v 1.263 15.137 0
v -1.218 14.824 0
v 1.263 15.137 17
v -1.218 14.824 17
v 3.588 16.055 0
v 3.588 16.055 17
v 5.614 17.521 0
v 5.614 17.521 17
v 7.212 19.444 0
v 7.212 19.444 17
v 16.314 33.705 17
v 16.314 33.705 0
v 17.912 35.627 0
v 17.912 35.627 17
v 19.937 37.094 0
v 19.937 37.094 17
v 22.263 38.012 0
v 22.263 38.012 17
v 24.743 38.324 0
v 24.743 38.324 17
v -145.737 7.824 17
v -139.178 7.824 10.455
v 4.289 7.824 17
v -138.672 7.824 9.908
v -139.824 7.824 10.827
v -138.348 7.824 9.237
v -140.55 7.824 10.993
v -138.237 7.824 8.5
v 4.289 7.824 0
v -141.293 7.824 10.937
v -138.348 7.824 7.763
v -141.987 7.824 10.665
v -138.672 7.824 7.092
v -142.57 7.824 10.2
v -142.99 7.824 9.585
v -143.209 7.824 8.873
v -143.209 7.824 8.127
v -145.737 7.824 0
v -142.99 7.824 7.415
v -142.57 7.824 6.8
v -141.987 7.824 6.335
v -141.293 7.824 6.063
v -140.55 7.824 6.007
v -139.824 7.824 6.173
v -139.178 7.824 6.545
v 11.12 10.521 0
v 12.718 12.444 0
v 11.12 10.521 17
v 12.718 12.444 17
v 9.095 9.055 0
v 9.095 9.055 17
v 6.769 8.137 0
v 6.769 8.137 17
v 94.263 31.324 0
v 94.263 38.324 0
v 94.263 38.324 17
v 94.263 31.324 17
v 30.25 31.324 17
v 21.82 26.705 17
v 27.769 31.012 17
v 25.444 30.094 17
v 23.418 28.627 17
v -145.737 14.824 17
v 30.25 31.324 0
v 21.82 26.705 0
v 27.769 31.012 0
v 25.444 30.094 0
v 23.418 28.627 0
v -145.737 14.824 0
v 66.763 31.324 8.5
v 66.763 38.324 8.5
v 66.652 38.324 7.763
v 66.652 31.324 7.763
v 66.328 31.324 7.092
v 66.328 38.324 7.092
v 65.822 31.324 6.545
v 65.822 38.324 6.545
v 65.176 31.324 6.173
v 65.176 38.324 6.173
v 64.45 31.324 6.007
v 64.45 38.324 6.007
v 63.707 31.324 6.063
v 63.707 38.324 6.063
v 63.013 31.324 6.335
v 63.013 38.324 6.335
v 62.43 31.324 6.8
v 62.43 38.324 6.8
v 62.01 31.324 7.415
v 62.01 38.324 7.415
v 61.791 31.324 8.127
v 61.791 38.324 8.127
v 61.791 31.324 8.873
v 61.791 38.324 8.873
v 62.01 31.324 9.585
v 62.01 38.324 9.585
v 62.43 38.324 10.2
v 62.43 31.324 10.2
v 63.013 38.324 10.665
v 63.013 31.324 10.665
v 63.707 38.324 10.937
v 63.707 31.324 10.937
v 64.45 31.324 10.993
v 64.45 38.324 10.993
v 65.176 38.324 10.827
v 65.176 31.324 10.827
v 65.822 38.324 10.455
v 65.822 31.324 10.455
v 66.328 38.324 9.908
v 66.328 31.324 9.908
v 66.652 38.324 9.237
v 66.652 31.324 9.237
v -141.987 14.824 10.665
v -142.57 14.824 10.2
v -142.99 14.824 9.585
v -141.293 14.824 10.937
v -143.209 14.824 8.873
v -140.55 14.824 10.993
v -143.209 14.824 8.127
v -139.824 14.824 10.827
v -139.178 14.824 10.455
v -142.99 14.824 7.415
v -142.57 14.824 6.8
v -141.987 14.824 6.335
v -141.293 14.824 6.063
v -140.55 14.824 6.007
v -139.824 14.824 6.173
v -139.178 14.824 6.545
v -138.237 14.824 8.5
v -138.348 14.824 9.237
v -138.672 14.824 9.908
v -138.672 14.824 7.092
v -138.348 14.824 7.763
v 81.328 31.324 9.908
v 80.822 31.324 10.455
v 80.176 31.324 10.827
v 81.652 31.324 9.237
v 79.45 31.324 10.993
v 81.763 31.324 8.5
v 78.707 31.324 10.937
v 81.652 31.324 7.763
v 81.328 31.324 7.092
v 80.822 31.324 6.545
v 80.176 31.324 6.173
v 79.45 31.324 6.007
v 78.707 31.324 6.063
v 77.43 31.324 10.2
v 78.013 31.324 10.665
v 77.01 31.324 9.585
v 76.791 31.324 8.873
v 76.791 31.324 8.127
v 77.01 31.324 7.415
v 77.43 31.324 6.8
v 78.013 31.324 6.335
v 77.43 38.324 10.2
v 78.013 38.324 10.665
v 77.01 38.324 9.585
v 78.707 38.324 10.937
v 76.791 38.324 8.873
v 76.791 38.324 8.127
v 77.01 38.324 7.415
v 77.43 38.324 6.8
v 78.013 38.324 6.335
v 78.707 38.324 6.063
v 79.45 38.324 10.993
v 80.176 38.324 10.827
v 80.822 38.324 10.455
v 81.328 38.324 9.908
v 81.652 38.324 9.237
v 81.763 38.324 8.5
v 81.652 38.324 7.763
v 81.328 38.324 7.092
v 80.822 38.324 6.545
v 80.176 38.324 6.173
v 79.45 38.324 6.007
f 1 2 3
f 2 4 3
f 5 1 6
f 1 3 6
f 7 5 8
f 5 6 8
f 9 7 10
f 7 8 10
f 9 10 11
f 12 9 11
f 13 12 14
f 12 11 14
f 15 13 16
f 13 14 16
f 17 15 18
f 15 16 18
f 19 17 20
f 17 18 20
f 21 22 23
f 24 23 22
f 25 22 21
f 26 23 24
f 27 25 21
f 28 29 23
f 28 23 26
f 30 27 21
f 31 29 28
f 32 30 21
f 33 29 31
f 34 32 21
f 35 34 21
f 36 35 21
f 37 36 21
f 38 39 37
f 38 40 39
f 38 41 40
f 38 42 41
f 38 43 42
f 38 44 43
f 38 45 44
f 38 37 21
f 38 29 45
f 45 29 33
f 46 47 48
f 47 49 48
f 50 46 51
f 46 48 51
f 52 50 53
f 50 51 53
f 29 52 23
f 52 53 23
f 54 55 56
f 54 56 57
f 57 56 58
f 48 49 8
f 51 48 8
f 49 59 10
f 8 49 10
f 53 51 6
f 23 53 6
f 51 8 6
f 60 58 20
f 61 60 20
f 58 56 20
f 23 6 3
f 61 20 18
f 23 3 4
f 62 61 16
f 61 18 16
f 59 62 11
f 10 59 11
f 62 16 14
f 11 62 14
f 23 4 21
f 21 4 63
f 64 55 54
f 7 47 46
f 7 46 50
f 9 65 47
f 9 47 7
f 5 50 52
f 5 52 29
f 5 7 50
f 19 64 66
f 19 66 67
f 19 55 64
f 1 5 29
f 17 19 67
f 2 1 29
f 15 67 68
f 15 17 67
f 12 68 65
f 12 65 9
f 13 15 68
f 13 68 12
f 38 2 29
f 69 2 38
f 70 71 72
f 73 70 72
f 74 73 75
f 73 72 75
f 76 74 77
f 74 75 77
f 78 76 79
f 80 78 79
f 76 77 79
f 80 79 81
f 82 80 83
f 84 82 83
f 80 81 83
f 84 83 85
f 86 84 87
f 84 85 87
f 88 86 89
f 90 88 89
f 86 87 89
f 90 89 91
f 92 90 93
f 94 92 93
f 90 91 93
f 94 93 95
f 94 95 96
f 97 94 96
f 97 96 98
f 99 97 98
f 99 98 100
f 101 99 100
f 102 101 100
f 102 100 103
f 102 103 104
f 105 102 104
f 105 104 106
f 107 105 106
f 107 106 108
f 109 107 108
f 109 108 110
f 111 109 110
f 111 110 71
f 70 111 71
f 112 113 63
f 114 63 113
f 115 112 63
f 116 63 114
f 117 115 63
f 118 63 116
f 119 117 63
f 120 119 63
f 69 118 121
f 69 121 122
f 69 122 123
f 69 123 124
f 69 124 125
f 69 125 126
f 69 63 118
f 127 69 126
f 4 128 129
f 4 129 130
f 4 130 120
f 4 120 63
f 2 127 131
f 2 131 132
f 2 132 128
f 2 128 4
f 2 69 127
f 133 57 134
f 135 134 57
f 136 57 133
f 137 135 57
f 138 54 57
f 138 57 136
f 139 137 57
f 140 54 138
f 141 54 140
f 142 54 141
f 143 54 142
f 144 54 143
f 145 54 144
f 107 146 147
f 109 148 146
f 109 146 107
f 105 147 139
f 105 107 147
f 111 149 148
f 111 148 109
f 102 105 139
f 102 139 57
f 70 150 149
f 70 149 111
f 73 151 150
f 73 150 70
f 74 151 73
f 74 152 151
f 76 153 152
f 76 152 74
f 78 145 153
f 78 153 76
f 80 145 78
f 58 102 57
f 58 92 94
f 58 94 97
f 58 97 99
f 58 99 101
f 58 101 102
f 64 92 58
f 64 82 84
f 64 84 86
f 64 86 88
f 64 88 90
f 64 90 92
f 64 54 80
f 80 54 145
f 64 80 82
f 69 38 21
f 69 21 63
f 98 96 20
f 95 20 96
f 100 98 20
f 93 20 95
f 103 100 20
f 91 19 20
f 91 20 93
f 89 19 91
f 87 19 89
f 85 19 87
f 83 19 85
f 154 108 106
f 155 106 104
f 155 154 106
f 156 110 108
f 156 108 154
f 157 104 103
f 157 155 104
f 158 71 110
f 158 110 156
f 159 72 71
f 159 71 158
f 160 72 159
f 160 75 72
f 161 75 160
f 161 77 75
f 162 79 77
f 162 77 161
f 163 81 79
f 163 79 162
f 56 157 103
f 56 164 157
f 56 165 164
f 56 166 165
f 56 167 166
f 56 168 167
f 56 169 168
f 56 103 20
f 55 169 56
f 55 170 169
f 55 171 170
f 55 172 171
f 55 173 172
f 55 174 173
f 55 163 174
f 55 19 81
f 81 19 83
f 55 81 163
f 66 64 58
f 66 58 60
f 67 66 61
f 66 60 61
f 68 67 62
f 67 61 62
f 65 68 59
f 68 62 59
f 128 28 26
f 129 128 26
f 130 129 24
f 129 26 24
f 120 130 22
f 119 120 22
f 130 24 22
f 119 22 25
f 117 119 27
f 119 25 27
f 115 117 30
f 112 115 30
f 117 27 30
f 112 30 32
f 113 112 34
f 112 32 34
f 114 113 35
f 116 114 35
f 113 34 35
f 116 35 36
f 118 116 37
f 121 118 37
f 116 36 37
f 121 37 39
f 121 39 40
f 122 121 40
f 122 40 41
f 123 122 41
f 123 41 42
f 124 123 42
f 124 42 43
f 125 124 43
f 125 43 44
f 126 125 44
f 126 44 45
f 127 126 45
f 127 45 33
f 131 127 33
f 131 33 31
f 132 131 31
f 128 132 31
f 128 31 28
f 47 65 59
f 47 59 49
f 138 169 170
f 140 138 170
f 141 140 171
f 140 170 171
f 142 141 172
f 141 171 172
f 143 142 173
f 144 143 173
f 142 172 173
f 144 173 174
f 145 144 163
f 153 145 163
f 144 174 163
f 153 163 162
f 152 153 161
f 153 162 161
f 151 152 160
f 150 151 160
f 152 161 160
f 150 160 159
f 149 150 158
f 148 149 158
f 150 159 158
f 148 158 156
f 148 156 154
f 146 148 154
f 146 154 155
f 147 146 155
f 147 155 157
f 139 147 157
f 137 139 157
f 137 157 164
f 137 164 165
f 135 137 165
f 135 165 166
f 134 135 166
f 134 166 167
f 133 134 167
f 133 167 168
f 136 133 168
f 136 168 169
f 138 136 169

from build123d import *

# Parameters (mm, degrees)
EXTRUDE1_DEPTH = 17
FILLET1_R      = 10
SKETCH2_R      = 2.5
EXTRUDE2_DEPTH = 17
SKETCH3_R      = 2.5
EXTRUDE3_DEPTH = 17


with BuildPart() as part:
    # Sketch1 → Extrude1 (new body)
    with BuildSketch(Plane.XY):
        Polygon((-145.737121951, 14.824159554), (4.262878049, 14.824159554), (19.262878049, 38.324159554), (94.262878049, 38.324159554), (94.262878049, 31.324159554), (24.769095529, 31.324159554), (9.769095529, 7.824159554), (-145.737121951, 7.824159554), align=None)
    extrude(amount=EXTRUDE1_DEPTH)

    # Fillet1
    fillet1_edges = [part.edges().sort_by_distance(p)[0] for p in [
        (4.262878049, 14.824159554, 8.5),
        (19.262878049, 38.324159554, 8.5),
        (24.769095529, 31.324159554, 8.5),
        (9.769095529, 7.824159554, 8.5),
    ]]
    fillet(fillet1_edges, radius=FILLET1_R)

    # Sketch2 → Extrude2 (cut)
    with BuildSketch(Plane(origin=(0, 38.324159554, 0), x_dir=(1, 0, 0), z_dir=(0, 1, 0))):
        with Locations((79.262878049, -8.5)):
            Circle(SKETCH2_R)
        with Locations((64.262878049, -8.5)):
            Circle(SKETCH2_R)
    extrude(amount=-EXTRUDE2_DEPTH, mode=Mode.SUBTRACT)

    # Sketch3 → Extrude3 (cut)
    with BuildSketch(Plane.XZ.offset(-7.824159554)):
        with Locations((-140.737121951, 8.5)):
            Circle(SKETCH3_R)
    extrude(amount=-EXTRUDE3_DEPTH, mode=Mode.SUBTRACT)


solid = part.part
